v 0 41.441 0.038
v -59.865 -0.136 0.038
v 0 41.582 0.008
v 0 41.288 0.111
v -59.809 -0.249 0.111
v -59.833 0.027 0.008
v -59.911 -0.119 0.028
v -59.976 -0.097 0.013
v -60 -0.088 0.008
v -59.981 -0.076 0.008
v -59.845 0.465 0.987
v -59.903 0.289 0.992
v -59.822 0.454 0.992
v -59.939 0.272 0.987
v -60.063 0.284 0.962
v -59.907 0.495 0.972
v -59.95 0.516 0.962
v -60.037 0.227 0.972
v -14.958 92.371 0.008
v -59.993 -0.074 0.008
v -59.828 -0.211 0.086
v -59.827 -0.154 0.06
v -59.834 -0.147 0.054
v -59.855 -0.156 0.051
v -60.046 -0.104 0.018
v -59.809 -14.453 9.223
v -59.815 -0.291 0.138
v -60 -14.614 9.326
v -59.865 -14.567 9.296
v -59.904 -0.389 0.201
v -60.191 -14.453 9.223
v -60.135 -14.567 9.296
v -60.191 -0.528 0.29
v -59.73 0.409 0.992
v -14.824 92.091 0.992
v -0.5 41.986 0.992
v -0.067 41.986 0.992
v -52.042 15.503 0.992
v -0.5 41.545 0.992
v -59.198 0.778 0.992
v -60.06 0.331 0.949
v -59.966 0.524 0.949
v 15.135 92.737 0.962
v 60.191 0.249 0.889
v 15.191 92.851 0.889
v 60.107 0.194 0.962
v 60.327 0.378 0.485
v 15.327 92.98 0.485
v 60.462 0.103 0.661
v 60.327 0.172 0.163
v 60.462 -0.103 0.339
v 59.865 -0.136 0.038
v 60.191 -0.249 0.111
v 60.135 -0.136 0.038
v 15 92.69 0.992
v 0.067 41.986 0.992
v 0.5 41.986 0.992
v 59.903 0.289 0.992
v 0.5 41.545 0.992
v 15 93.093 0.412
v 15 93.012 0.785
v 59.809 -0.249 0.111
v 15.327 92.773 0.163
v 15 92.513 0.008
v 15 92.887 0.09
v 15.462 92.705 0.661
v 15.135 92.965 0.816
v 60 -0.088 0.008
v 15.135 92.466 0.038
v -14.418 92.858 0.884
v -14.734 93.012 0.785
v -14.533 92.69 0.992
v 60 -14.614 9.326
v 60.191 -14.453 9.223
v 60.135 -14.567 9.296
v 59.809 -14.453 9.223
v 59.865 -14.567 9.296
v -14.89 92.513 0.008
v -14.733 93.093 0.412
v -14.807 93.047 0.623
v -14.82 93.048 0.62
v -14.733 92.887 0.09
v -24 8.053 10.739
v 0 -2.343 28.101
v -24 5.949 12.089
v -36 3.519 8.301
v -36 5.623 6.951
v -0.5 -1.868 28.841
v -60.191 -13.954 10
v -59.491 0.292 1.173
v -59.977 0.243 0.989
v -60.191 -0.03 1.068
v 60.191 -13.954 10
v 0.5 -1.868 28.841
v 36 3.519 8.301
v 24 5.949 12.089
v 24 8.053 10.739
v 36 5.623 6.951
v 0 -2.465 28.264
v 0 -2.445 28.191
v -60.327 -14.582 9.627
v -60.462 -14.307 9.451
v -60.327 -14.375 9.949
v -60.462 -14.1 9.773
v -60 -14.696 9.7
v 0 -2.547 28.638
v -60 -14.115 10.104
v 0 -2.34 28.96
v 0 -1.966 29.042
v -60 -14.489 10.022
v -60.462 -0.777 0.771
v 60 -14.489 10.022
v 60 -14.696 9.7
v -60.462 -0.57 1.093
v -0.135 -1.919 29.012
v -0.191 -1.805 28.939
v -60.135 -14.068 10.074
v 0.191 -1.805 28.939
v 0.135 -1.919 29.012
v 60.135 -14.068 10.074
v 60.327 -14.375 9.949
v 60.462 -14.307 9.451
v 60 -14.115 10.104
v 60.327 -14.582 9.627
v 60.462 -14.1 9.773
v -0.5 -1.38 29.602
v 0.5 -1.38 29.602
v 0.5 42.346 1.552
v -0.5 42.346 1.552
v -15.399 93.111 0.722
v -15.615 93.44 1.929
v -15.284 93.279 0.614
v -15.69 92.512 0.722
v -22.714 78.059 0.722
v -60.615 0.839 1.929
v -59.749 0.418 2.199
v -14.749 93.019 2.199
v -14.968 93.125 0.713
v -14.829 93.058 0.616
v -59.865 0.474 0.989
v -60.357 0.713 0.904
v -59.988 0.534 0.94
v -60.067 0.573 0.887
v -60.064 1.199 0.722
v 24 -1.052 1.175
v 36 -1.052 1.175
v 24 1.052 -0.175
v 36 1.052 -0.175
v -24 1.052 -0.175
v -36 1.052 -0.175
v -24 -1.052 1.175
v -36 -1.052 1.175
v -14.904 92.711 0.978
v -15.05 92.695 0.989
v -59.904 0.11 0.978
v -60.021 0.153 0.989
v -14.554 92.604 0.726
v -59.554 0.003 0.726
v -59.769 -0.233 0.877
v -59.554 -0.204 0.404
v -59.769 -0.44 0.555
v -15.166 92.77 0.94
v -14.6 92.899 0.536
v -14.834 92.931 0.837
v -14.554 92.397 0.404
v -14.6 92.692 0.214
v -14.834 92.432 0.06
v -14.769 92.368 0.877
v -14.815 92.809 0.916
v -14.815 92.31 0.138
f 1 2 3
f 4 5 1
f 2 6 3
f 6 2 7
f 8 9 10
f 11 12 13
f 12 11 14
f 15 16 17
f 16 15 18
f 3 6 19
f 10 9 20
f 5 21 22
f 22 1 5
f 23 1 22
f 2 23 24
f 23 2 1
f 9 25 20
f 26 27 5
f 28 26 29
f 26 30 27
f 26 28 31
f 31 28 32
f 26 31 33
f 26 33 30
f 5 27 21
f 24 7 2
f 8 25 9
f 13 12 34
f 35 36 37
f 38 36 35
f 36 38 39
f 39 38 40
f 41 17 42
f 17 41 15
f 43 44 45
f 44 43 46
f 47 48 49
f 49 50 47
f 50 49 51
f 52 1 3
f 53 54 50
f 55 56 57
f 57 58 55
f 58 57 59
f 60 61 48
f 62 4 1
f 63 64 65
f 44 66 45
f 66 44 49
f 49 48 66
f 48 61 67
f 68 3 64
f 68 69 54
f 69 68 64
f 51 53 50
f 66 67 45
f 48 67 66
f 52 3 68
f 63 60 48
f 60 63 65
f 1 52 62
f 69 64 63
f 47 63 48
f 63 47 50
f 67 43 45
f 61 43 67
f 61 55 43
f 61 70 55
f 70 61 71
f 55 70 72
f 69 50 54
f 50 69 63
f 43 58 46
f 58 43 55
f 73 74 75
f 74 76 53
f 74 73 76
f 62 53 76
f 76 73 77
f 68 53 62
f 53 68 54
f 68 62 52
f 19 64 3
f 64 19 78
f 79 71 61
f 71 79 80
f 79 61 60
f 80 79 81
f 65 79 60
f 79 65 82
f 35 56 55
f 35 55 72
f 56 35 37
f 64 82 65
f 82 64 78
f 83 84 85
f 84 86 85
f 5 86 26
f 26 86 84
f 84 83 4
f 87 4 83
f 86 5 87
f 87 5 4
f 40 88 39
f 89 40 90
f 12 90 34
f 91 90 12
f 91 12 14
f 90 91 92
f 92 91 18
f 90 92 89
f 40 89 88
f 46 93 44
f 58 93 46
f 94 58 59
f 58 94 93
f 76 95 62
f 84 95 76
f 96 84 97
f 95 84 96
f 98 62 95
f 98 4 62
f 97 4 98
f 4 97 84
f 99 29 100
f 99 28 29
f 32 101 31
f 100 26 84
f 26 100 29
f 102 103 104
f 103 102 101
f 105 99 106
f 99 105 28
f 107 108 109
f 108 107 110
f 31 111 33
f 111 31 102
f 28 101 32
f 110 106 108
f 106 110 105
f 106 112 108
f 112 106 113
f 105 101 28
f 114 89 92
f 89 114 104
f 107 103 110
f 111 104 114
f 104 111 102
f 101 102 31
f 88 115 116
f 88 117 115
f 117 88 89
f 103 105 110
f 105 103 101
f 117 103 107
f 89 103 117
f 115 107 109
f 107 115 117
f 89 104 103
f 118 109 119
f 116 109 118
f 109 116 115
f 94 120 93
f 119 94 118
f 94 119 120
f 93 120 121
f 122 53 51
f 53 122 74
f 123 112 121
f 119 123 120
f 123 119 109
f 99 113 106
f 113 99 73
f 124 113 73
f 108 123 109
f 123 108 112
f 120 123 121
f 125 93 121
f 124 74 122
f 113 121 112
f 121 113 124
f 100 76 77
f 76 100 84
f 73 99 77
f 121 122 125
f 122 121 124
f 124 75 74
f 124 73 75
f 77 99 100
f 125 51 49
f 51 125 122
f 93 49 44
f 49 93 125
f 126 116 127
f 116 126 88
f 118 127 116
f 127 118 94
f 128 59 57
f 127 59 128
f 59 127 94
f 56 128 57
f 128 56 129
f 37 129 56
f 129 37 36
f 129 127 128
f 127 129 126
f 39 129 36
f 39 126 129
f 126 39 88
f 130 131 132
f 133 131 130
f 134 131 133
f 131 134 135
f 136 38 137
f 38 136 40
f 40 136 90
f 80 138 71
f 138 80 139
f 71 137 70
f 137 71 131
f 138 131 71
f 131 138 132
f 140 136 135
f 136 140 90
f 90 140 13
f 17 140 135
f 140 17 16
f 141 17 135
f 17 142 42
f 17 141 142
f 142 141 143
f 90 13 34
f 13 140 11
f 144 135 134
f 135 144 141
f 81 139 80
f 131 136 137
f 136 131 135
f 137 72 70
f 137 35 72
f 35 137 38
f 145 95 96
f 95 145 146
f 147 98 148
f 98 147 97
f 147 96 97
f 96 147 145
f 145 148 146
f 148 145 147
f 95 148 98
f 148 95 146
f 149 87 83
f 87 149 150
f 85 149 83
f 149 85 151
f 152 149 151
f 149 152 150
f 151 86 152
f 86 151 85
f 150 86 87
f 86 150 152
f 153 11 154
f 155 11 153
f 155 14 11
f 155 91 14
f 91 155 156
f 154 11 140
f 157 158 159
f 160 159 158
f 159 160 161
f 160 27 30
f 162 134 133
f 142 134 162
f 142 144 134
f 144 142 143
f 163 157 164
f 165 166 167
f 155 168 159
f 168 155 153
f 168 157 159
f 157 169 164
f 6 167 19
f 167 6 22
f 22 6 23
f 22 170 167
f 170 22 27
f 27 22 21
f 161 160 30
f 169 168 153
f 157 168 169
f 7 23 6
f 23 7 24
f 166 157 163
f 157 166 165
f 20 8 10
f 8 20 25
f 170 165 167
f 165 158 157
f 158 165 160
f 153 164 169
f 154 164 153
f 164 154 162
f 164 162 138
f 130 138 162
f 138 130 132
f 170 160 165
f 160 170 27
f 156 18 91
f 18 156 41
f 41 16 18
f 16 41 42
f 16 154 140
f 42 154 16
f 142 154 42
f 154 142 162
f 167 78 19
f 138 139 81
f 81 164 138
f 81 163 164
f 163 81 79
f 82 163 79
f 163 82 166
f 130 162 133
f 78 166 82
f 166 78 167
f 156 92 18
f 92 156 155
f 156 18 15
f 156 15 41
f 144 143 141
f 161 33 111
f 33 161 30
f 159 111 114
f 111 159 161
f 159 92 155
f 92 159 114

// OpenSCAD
// file: commons.scad
module rect_prism(width, height, p0, p1) {
    dir = p1 - p0;
    h = norm(dir);
    if (dir[0] == 0 && dir[1] == 0) {
        // no transformation necessary
        translate(p0)
        translate([0, 0, h/2])
        cube([size, size, h], center = true);
    }
    else {
        w  = dir / h;
        u0 = cross(w, [0,0,1]);
        u  = u0 / norm(u0);
        v0 = cross(w, u);
        v  = v0 / norm(v0);
        multmatrix(m=[[u[0], v[0], w[0], p0.x],
                      [u[1], v[1], w[1], p0.y],
                      [u[2], v[2], w[2], p0.z],
                      [0,    0,    0,    1]])
        translate([0, 0, h/2])
        cube([width, height, h], center = true);
    }
}

module square_prism(size, p0, p1) {
    rect_prism(size, size, p0, p1);
}

module point_plate(thickness, point_array, indices, fn = 8) {
    hull() {
        for (i = indices) {
            translate(point_array[i])
            sphere(d = thickness, $fn = fn);
        }
    }
}
// file: wall-commons.scad
include <config.scad>;
use <commons.scad>;

FX = FACE_WIDTH/2;
FY = FACE_HEIGHT;
FF = FACE_HEIGHT_ROOF_START_RATIO;

COLUMN_HEIGHT = FF * FY - 0.0 * BEAM_SIZE;

STRUT_OVERRUN = 0.2 * FACE_THICKNESS;

module door_shape(width = FACE_DOOR_WIDTH, height = FACE_DOOR_HEIGHT, thickness = FACE_THICKNESS + 2 * STRUT_OVERRUN, ground_bleed = 0) {
    radius = width/2;
    straight_height = height - radius;

    difference() {
        translate([0, straight_height, 0])
        cylinder(h = thickness, r = radius, center = true);
        translate([-(width + BLEED)/2, straight_height - 2 * height - BLEED, -(thickness + BLEED)/2])
        cube([width + BLEED, 2 * height, thickness + BLEED], center = false);
    }
    translate([0, (straight_height - ground_bleed)/2, 0])
    cube([width, straight_height + ground_bleed, thickness], center = true);
}
// file: config.scad
// ----------------------------------------------------------------------------
// Configuration of the carousel and its components.
//
// All the values beyond "---- derived" string in each of the sections should
// not be modified manually, as they are derived from the previously defined
// parameters in some way...
// ----------------------------------------------------------------------------

// Generic parameters to address consistency & interconnections of parts.
CYL_FN = 32; // BEWARE!!! set to +- 256 for STL export!
BLEED = 0.5; // overlap for union & difference operations
EASE = 0.2; // socket/pin ease for interconnecting of parts & holes

// Core defining shape of our carousel is N-faced cylinder.
// This affects most of the subsequent parameter definitions & usage.
CAROUSEL_FACE_COUNT = 6;
CAROUSEL_ESCRIBED_RADIUS = 120;
// ---- derived
CAROUSEL_INSCRIBED_RADIUS = CAROUSEL_ESCRIBED_RADIUS * cos(180/CAROUSEL_FACE_COUNT);

// Base of the carousel -> stand that holds the axle, walls, etc.
BASE_TOTAL_HEIGHT = 24;
BASE_FLOOR_THICKNESS = 4;
BASE_WALL_THICKNESS = 4;

// Face, or, a wall of the carousel "shell".
FACE_HEIGHT = 150;
FACE_HEIGHT_ROOF_START_RATIO = 0.85;    // percentage of full wall height to be skewed

FACE_THICKNESS = 5;
// size of wall struts/doorframe
BEAM_SIZE = 1.1 * FACE_THICKNESS;

// ---- derived
FACE_WIDTH = CAROUSEL_ESCRIBED_RADIUS * 2 * sin(180/CAROUSEL_FACE_COUNT);
FACE_ANGLE = (1 - 2/CAROUSEL_FACE_COUNT)*180;
FACE_APOTHEM_LEN = FACE_WIDTH / (2 * tan(180/CAROUSEL_FACE_COUNT));
FACE_DOOR_HEIGHT = 0.66 * FACE_HEIGHT;
FACE_DOOR_WIDTH = 0.75 * FACE_WIDTH;

// Roof of the carousel.
ROOF_THICKNESS = 1;
ROOF_HEIGHT = 50;

// Ball bearing - real-life dimensions of ball bearing used to "power" the axle.
BEARING_DIAM_OUTER = 32;
BEARING_DIAM_INNER = 15;
BEARING_HEIGHT_BOTTOM = 8;
BEARING_HEIGHT_TOP = 5;
BEARING_SHELL_THICKNESS = 1;
BEARING_SHELL_BOTTOM = 3;
BEARING_SHELL_TOP = 7;

BEARING_PEG_OVERRUN = BEARING_HEIGHT_TOP;

// Axle rotating inside carousel.
AXLE_RADIUS = FACE_THICKNESS;

// Rotating rig carrying the seats.
RIG_HEIGHT = 6;
RIG_STR = 6;

RIG_NUT_SIZE = 10;  // 4 for M4 nut, 10 for M10 nut, etc.
RIG_NUT_WALL = 3;   // thickness of the wall around hole to carry nut

// Abstract "rings" carrying seats, and their distance off the carousel center
// as a fraction of radius.
RIG_RING_POSITIONS = [0.4, 0.8];
RIG_MAX_R = 0.90 * CAROUSEL_INSCRIBED_RADIUS;

COLOR_WALL = "BurlyWood";
COLOR_STRUTS = "SaddleBrown";
COLOR_BASE = "DarkGray";
COLOR_ROOF = "DarkSeaGreen";
COLOR_AXLE = "SaddleBrown";
// main file
include <config.scad>;
include <wall-commons.scad>;

use <commons.scad>;

canopy_height = (1-FF)*FY;

roof_canopy_overhang = 0.75 * canopy_height;

// TOP-VIEW for key_points
//
//       tx
//      |---|
//      |   |
//      |
//      |   5           -      -
//      |  /a\          |      |
//        / | \ ihr     | ty   |
//       /b | b\        |      |
//      1---+---2       -      | FAL
//     /    |    \             |
//    /    _4_    \            |
//   /b /-/   \-\ b\           |
//  0--/         \--3          -
inner_hole_radius = 0.25 * CAROUSEL_ESCRIBED_RADIUS;
top_alpha = 360/CAROUSEL_FACE_COUNT;
top_beta = 90 - top_alpha/2;
// (ihr / CAROUSEL_INSCRIBED_RADIUS) == (ty / FACE_APOTHEM_LEN)
ty = FACE_APOTHEM_LEN * inner_hole_radius / CAROUSEL_ESCRIBED_RADIUS;
tx = cos(top_beta) * inner_hole_radius;

max_x = FX;
max_y = FACE_APOTHEM_LEN - ty;
max_z = ROOF_HEIGHT;

//(max_z / max_y) == ((max_z - canopy_height) / ey)
ey = max_y * (max_z - canopy_height) / max_z;

alpha = atan((max_z - canopy_height) / ey);

module roof_connector_joint(is_hole_mode = false) {

    max_z = canopy_height;

    width = FX/5 + (is_hole_mode ? EASE : 0);
    thickness = 0.5 * FACE_THICKNESS + (is_hole_mode ? EASE : 0);

    h1 = (FX/2-width/2)/FX * max_z;
    h2 = (FX/2+width/2)/FX * max_z;

    points = [[-width/2, 0], [+width/2, 0], [+width/2, h2], [-width/2, h1]];

    bleed_z_fix = is_hole_mode ? BLEED : 0;

    translate([0, 0, bleed_z_fix])
    rotate([90, 0, 0])
    linear_extrude(thickness, center = true)
    polygon(points);
}

module roof_shape() {

    key_points = [
        [-max_x, 0, 0], // A
        [-tx, max_y, max_z], // B
        [+tx, max_y, max_z], // C
        [+max_x, 0, 0], // D
        [0, max_y-ey, canopy_height], // E
        [0, 0, canopy_height], // F
        [-max_x, -roof_canopy_overhang, 0],
        [0, -roof_canopy_overhang, canopy_height],
        [+max_x, -roof_canopy_overhang, 0]
    ];

    edge_width = 1.0 * ROOF_THICKNESS;

    color(COLOR_ROOF) {
        // main left
        point_plate(ROOF_THICKNESS, key_points, [0, 1, 4]);
        // main right
        point_plate(ROOF_THICKNESS, key_points, [2, 3, 4]);
        // main center
        point_plate(ROOF_THICKNESS, key_points, [1, 2, 4]);
        // left canopy
        point_plate(ROOF_THICKNESS, key_points, [0, 4, 5]);
        // right canopy
        point_plate(ROOF_THICKNESS, key_points, [3, 5, 4]);
        // left overhang
        point_plate(ROOF_THICKNESS, key_points, [0, 4, 7, 6]);
        // right overhang
        point_plate(ROOF_THICKNESS, key_points, [4, 3, 8, 7]);
        // canopy blade
        translate([0, 0, 0.5 * ROOF_THICKNESS])
        rect_prism(edge_width, 1.5 * ROOF_THICKNESS, key_points[4], key_points[7]);

        // TODO - cut off and make standalone connector
        translate([0, 0, 1.0 * ROOF_THICKNESS])
        rect_prism(edge_width, 1.5 * ROOF_THICKNESS, key_points[0], key_points[1]);

        // roof to wall connectors
        translate([+FX/2, 0, 0])
        rotate([0, 0, 180])
        roof_connector_joint();

        translate([-FX/2, 0, 0])
        roof_connector_joint();
    }

}

module trimmed_roof() {
    // trim off parts that would overlap when joining multiple segments
    // on final carousel
    translate([0, FACE_APOTHEM_LEN, 0])
    difference() {
        translate([0, -FACE_APOTHEM_LEN, 0])
        roof_shape();

        rotate([0, 0, -360/CAROUSEL_FACE_COUNT])
        translate([0, -FACE_APOTHEM_LEN, 0])
        roof_shape();
    }
}

module printable_roof_segment() {
    translate([0, 0, 0.5 * ROOF_THICKNESS])
    rotate([-alpha, 0, 0])
    trimmed_roof();
}

module carousel_roof_mounted() {
    translate([0, 0, FF*FY + 0.5 * ROOF_THICKNESS])
    trimmed_roof();
}

// carousel_roof_mounted();
// roof_connector_joint();
printable_roof_segment();
